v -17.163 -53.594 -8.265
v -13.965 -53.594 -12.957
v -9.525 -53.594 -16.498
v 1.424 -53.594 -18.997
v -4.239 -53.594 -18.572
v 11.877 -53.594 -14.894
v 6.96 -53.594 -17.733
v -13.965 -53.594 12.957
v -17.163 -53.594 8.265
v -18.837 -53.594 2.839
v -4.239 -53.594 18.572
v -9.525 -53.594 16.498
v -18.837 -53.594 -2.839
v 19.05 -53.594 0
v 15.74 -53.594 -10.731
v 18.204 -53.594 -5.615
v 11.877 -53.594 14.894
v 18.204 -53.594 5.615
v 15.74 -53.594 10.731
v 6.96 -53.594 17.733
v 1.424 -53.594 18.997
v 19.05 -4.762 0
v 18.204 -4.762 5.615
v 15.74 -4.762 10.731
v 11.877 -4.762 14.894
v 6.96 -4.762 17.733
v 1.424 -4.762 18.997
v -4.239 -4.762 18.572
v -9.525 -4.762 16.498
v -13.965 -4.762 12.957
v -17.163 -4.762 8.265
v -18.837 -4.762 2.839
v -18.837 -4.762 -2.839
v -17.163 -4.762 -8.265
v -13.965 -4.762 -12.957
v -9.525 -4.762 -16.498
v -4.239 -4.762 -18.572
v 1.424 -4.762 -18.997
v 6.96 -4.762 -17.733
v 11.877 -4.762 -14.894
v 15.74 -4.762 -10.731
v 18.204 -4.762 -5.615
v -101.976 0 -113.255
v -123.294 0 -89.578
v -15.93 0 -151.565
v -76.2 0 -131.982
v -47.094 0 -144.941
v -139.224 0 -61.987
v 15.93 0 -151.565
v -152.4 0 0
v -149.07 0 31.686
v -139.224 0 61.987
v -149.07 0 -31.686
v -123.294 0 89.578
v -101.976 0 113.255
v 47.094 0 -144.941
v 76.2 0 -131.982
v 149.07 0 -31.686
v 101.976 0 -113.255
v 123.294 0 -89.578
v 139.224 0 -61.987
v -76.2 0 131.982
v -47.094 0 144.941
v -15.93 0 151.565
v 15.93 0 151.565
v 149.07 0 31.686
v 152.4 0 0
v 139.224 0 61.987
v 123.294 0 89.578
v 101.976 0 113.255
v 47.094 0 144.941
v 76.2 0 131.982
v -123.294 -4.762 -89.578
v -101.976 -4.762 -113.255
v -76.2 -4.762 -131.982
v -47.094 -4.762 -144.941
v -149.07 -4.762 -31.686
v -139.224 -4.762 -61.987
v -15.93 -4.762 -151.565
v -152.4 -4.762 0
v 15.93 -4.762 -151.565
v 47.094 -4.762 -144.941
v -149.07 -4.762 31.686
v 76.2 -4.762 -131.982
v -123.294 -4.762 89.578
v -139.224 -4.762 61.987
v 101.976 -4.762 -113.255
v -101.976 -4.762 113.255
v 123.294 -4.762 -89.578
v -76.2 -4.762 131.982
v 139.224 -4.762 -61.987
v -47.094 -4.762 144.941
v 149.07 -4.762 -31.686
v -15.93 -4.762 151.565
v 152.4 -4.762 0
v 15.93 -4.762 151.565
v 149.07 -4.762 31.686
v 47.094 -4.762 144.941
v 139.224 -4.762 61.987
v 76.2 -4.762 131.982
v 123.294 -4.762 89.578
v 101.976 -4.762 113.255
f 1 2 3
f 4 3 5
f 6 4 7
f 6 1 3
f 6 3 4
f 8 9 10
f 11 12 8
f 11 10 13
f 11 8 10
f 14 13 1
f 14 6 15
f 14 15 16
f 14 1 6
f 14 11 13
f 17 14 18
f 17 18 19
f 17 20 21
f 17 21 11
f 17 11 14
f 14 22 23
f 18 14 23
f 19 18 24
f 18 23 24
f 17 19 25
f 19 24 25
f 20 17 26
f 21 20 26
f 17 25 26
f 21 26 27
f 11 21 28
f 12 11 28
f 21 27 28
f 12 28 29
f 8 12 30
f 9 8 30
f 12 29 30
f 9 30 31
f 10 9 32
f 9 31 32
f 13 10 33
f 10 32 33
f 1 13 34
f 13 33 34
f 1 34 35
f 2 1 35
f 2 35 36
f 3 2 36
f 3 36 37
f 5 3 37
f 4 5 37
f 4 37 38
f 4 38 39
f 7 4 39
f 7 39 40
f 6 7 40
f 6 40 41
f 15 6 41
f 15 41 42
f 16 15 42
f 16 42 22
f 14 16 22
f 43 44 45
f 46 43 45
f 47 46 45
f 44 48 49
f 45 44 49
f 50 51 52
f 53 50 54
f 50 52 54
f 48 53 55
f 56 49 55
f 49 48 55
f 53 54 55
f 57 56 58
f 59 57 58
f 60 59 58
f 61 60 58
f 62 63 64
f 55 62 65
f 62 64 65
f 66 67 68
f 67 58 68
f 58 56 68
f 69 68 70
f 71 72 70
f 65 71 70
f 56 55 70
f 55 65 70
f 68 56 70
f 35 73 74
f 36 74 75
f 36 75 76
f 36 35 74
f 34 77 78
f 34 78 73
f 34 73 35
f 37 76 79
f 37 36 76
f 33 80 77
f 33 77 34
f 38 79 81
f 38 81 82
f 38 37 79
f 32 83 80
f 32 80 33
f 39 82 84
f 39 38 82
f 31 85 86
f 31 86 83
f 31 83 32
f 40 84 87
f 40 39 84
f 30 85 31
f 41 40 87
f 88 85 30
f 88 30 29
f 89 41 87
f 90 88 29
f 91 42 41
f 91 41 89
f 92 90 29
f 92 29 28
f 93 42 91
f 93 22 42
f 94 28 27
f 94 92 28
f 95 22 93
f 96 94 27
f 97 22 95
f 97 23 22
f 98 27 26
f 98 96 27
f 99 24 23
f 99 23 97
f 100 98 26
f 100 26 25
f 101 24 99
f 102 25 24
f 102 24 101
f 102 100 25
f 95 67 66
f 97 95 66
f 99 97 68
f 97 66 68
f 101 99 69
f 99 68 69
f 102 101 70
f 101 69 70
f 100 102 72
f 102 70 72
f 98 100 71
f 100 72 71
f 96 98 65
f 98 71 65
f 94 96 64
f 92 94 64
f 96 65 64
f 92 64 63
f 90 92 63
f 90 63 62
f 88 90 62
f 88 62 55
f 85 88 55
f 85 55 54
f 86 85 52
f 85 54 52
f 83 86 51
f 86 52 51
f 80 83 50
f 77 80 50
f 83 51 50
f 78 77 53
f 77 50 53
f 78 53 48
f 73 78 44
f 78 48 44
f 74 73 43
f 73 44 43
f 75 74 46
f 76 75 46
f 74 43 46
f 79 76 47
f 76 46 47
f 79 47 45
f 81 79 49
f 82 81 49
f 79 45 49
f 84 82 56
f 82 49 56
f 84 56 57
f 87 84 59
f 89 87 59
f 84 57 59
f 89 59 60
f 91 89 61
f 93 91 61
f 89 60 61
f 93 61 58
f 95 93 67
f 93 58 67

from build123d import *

# Parameters (mm, degrees)
F0_R     = 19.05
F1_DEPTH = 53.594
F0_R_2   = 152.4
F2_DEPTH = 4.7625
F0_W     = 457.2
F0_H     = 355.6
F3_DEPTH = 15.875


with BuildPart() as f1:
    # F0 (on Front) → F1 (new body)
    with BuildSketch(Plane.XZ):
        Circle(F0_R)
    extrude(amount=F1_DEPTH)

    # F0 (on Front) → F2 (join)
    with BuildSketch(Plane.XZ):
        Circle(F0_R_2)
        Circle(F0_R, mode=Mode.SUBTRACT)
    extrude(amount=F2_DEPTH)


with BuildPart() as f3:
    # F0 (on Front) → F3 (new body)
    with BuildSketch(Plane.XZ):
        Rectangle(F0_W, F0_H)
        Circle(F0_R_2, mode=Mode.SUBTRACT)
    extrude(amount=F3_DEPTH)


solid = f1.part
